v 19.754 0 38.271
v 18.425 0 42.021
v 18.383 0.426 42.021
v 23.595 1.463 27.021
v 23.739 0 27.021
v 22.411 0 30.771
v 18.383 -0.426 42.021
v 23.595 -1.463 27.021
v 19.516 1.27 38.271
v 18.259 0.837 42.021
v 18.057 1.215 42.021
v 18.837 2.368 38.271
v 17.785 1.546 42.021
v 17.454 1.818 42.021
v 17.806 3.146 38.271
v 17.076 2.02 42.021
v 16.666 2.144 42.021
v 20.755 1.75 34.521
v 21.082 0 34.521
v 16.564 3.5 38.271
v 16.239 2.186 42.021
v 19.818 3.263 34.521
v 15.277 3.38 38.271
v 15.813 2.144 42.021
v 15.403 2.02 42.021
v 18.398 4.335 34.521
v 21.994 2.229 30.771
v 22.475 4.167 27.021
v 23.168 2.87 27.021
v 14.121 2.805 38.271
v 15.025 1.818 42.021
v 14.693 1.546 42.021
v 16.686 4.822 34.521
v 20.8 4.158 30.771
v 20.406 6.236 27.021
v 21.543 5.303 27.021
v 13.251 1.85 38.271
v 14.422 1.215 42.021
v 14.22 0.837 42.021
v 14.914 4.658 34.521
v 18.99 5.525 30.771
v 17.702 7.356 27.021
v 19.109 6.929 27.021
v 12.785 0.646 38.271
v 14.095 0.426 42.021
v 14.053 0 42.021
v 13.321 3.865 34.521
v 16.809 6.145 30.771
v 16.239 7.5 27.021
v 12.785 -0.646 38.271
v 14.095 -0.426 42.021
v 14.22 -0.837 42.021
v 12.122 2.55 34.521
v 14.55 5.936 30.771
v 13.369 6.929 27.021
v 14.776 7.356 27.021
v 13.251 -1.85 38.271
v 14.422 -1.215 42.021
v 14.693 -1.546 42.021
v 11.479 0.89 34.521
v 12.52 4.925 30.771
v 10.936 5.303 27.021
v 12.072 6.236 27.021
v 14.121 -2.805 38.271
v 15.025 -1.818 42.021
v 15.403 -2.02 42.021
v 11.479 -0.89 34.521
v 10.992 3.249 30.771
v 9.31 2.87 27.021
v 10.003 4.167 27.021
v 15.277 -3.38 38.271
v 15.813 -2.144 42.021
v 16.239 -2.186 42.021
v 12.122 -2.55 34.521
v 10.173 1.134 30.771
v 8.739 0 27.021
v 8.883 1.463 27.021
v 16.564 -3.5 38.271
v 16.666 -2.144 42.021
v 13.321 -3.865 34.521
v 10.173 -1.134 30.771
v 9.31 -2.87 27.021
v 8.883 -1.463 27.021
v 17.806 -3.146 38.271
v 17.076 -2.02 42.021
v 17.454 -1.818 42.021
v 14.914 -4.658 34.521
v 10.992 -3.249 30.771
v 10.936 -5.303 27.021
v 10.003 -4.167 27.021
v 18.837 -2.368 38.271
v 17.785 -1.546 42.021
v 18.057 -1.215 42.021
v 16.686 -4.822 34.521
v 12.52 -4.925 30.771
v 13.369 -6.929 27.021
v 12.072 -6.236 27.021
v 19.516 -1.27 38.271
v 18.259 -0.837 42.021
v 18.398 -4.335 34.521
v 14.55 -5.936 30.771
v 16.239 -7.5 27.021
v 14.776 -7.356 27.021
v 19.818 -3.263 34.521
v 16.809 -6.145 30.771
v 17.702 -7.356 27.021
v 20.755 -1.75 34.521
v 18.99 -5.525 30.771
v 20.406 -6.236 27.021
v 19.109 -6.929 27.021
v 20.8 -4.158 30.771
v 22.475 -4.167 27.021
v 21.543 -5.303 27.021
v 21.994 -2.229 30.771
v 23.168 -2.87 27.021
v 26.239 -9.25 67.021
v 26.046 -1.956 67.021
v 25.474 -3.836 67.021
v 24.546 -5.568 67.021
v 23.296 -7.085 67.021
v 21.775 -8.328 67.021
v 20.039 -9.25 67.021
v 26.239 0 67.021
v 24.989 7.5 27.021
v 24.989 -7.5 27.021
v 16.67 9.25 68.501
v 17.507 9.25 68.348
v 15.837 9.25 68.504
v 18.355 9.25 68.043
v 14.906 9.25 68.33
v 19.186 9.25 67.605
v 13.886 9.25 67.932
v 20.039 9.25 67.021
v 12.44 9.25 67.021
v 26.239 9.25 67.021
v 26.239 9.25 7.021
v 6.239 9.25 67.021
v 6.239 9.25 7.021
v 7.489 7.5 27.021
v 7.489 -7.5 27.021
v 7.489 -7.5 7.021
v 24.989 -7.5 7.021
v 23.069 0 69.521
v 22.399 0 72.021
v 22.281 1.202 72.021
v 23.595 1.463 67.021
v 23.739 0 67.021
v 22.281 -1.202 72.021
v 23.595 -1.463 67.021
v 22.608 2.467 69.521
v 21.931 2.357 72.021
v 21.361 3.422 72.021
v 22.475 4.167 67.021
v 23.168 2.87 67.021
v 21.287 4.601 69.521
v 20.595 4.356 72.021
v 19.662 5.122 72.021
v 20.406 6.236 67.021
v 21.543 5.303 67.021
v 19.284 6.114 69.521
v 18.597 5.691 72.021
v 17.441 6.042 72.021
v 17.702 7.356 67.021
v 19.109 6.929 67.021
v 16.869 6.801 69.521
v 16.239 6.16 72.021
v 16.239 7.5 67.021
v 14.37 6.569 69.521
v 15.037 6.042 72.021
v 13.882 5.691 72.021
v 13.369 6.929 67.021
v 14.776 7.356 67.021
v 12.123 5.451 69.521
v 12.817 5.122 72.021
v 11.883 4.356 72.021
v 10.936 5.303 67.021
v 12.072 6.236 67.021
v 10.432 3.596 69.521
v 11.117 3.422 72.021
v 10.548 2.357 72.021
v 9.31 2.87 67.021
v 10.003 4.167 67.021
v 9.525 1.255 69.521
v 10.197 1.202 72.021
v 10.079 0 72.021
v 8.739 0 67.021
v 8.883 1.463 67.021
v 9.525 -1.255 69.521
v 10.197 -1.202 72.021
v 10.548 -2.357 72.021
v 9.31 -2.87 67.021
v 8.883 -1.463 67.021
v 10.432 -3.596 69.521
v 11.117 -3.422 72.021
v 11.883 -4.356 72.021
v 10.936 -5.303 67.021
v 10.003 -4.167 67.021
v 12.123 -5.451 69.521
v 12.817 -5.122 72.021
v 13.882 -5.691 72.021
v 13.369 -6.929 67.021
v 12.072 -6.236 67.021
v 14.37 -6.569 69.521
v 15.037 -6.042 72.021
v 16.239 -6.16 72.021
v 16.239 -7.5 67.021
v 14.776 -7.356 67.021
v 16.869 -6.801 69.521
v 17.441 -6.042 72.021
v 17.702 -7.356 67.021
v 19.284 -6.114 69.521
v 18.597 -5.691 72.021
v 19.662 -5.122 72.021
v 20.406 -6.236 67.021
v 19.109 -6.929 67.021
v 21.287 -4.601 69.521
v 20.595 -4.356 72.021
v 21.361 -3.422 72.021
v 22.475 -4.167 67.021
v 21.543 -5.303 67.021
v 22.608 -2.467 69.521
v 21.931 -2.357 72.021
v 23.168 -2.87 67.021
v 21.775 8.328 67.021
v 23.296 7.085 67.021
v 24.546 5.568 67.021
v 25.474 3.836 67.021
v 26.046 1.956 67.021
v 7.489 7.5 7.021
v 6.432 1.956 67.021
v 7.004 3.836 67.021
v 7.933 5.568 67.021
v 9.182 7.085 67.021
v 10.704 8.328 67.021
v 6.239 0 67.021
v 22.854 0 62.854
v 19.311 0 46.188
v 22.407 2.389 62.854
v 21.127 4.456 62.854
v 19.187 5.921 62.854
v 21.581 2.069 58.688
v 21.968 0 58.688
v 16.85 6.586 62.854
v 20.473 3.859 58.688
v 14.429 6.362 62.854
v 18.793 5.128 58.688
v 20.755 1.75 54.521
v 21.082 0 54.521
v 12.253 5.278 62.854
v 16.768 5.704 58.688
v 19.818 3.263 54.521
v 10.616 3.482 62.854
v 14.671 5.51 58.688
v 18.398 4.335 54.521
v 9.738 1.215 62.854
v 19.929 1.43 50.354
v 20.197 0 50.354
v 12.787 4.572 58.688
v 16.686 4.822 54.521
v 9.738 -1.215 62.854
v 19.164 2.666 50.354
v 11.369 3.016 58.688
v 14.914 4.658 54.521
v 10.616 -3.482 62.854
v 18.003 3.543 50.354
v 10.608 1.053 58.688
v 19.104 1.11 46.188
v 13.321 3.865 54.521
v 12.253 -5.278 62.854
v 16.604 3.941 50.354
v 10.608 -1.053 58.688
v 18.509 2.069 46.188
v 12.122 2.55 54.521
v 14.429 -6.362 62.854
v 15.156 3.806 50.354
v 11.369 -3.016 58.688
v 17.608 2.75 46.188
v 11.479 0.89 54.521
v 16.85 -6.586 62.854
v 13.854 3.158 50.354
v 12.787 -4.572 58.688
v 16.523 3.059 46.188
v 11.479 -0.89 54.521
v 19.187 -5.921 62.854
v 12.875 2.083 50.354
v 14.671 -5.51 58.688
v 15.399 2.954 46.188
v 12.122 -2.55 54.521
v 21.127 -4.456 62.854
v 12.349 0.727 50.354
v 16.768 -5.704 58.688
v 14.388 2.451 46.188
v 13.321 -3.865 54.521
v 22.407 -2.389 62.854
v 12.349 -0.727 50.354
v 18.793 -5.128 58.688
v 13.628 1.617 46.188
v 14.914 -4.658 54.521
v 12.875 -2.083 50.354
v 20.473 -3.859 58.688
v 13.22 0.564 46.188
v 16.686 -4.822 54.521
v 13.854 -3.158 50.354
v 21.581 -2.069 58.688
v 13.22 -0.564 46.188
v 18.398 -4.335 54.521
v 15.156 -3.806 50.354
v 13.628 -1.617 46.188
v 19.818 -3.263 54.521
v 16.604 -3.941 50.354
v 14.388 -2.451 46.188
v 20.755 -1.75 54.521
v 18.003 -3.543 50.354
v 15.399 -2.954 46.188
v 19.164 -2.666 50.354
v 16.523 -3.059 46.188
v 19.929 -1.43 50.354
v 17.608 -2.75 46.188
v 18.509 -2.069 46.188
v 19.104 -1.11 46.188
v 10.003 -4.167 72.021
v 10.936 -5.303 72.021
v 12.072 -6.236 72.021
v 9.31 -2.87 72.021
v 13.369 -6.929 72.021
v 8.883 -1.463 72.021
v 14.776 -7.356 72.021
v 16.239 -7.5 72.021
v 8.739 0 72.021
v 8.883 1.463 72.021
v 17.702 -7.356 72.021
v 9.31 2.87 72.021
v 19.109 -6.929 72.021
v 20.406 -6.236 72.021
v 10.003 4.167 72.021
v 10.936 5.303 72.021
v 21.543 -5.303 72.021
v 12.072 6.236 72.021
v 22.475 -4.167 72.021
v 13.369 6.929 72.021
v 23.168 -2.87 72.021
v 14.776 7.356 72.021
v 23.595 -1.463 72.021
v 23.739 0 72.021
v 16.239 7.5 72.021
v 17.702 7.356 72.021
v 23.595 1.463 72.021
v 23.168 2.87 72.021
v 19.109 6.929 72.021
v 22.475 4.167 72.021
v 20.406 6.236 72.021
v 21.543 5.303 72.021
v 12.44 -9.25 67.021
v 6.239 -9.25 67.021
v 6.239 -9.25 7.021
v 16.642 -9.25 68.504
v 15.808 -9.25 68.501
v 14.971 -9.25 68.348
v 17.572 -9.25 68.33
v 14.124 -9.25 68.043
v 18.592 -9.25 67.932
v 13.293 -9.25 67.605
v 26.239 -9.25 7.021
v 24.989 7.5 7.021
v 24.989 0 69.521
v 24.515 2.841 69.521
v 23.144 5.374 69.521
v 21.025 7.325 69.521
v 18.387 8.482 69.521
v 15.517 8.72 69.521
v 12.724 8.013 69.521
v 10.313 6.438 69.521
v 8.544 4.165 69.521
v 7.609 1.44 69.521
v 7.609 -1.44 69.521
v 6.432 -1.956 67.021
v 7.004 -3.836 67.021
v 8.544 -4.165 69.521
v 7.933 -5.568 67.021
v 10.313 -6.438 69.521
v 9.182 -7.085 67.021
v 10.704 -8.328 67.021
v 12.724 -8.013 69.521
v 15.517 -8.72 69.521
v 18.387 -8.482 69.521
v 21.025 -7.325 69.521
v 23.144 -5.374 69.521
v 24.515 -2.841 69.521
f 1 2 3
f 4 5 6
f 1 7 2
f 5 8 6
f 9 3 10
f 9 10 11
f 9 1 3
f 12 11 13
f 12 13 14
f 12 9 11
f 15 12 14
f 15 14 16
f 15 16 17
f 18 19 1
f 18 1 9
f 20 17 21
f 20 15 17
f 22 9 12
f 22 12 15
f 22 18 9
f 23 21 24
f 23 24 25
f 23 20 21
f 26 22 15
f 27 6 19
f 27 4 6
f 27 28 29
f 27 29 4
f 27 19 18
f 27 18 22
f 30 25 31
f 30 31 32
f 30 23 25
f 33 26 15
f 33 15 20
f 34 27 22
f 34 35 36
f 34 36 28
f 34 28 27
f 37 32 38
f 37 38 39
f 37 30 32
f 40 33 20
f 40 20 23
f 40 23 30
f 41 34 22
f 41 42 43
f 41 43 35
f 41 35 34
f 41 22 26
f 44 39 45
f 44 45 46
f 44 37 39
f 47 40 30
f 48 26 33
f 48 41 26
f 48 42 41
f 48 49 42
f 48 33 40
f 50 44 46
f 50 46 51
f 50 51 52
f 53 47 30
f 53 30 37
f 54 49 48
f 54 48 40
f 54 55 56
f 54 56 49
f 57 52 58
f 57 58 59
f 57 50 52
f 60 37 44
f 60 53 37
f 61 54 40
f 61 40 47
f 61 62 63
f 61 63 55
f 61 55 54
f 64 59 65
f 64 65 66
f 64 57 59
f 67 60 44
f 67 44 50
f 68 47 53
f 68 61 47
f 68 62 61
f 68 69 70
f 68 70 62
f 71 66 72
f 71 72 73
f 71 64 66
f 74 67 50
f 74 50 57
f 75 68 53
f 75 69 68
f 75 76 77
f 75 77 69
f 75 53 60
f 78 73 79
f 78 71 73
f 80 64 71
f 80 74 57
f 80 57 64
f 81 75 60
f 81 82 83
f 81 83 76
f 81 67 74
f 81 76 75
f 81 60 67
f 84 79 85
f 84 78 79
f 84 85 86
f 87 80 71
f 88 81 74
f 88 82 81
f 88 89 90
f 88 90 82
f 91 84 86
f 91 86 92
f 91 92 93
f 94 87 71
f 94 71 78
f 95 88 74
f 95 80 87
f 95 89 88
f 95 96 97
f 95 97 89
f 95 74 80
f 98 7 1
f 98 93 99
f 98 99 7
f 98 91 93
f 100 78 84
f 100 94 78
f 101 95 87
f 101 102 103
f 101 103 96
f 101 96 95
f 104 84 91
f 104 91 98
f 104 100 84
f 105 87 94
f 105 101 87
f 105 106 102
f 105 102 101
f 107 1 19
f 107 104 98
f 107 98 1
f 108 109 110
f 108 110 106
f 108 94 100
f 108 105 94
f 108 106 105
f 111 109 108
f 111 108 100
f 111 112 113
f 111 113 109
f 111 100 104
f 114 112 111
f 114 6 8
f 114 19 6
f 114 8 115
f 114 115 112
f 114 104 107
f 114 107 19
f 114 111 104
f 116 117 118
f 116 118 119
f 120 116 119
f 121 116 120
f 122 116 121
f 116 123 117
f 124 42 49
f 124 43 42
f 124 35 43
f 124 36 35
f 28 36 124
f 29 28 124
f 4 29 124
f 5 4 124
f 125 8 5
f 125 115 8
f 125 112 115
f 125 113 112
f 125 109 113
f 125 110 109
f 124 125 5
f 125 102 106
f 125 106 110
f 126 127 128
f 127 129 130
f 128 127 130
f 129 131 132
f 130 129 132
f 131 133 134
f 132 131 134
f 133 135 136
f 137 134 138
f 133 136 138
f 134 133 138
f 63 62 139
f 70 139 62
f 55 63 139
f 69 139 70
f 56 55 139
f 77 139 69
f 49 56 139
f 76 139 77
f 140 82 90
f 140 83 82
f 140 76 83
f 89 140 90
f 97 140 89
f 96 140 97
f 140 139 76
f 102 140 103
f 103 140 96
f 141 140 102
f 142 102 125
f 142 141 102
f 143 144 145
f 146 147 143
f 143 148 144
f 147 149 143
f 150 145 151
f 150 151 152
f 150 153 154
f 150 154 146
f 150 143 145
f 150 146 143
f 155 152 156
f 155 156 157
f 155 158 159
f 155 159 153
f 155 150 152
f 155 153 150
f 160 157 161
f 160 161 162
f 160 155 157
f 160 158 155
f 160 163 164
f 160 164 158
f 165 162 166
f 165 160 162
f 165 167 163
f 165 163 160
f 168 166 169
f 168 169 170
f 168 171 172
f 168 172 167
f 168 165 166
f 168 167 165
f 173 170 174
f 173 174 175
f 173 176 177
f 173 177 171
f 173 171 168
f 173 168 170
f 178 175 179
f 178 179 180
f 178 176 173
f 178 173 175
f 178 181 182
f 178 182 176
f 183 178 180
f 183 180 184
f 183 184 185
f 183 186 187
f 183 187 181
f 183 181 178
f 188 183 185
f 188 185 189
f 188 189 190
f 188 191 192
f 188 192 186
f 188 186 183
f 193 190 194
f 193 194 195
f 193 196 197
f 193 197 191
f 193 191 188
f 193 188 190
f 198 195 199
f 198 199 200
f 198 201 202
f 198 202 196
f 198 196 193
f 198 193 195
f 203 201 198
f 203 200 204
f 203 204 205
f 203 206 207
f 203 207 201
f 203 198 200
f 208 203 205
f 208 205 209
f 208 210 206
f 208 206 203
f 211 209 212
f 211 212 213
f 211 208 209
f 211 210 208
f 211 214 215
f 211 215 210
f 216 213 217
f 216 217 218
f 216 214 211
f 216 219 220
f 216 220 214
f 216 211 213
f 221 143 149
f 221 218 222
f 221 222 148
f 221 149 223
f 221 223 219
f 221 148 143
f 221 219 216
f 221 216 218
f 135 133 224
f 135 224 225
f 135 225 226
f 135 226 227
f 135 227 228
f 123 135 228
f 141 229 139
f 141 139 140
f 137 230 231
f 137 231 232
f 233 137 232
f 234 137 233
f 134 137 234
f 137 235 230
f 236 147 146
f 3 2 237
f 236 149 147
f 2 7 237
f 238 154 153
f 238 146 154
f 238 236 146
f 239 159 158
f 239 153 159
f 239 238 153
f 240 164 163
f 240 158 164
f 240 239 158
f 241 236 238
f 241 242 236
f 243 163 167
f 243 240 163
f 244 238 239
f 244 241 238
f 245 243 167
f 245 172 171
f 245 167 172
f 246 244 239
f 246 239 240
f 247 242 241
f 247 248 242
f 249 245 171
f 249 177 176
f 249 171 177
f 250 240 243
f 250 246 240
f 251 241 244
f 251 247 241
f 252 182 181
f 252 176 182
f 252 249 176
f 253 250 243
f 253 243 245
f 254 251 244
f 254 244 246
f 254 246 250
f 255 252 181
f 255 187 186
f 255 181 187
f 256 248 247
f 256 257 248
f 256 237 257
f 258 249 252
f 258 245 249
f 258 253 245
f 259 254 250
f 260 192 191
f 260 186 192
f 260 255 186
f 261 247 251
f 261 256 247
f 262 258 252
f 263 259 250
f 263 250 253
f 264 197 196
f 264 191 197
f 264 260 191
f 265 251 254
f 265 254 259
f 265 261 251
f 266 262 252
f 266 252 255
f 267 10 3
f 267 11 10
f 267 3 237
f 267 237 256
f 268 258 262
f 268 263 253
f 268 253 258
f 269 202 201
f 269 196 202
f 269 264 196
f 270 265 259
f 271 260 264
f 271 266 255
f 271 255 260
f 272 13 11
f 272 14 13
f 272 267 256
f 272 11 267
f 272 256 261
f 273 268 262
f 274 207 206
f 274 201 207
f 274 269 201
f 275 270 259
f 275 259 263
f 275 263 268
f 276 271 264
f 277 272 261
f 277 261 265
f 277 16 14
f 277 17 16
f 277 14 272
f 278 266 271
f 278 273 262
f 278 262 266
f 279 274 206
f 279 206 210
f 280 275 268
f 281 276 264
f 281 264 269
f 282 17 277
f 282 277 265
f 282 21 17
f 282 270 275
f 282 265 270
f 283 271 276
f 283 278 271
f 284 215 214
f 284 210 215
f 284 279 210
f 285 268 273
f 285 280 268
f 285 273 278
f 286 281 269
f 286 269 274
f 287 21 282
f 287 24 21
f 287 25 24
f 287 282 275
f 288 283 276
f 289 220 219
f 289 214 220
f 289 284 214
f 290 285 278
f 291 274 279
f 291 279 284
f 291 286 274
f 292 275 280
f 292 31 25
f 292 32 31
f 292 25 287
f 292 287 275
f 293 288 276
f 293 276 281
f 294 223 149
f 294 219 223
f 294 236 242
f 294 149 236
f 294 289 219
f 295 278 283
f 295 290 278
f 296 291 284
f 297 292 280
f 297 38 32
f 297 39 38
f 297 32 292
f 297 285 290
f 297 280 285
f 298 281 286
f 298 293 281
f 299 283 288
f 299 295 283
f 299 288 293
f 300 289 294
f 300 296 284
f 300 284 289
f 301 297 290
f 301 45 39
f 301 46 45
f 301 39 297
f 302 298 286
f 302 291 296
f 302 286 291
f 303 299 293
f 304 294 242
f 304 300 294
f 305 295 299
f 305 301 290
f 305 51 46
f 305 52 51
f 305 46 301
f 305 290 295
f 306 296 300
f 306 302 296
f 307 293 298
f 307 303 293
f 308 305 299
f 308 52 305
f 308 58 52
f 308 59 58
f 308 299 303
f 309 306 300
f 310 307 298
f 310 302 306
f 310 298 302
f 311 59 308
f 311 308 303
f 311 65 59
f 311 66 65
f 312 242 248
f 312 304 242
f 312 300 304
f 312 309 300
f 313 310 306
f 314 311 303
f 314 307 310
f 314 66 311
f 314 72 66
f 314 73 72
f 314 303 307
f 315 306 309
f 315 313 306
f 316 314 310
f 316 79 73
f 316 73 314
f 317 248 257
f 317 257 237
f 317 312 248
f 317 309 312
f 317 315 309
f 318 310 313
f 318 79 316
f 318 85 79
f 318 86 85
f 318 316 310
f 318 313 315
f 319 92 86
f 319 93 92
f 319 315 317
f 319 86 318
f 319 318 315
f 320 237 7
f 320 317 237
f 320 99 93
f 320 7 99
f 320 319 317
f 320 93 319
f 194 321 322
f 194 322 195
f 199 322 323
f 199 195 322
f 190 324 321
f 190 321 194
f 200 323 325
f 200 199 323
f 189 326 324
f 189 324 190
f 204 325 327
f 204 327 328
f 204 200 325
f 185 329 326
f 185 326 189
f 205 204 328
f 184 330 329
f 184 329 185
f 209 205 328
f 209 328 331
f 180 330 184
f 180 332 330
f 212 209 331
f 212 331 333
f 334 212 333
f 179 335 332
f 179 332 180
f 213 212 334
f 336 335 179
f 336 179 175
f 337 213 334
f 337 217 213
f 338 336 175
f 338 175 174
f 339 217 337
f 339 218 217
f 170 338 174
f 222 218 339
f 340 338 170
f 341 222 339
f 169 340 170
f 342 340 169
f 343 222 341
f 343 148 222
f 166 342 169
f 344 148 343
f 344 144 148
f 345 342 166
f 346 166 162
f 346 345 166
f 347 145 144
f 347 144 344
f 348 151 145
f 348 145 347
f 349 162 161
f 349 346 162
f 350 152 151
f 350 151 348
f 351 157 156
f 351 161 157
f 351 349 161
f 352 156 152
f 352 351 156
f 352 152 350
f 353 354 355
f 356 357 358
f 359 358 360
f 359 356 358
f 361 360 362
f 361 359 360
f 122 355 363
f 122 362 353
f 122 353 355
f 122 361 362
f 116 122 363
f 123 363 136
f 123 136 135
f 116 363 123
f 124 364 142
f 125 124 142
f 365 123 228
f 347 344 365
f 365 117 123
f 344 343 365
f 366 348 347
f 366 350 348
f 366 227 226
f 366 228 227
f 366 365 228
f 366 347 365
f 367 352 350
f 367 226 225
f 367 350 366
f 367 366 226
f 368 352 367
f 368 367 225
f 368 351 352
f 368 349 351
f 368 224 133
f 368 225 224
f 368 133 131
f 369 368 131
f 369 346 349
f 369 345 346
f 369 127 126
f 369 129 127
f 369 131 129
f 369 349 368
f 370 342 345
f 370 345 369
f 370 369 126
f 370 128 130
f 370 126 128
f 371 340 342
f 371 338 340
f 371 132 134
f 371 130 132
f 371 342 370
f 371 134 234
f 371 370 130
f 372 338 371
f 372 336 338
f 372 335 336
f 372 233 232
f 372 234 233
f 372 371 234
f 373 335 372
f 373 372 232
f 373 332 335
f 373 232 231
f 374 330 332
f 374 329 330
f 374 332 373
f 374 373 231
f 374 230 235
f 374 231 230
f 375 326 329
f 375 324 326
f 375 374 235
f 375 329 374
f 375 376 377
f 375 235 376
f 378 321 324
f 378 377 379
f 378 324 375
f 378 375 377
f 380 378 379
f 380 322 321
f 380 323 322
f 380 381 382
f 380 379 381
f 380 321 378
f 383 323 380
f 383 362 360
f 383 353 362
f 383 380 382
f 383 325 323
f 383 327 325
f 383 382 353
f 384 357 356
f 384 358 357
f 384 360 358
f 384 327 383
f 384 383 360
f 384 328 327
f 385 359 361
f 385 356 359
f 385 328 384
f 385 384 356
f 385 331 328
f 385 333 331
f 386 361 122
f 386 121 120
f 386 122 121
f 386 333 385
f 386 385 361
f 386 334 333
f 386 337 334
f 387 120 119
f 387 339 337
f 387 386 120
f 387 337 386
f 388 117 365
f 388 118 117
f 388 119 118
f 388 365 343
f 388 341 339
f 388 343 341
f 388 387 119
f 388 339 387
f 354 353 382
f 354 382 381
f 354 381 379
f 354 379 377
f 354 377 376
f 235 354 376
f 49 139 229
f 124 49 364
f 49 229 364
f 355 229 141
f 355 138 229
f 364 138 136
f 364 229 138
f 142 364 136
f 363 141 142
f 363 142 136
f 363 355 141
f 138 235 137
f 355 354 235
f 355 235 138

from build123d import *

# Parameters (mm, degrees)
F0_W      = 7.5
F0_H      = 20
F2_DEPTH  = 9.25
F4_DEPTH  = 40
F7_DEPTH  = 5
F9_W      = 17.5
F9_H      = 15
F10_DEPTH = 20


with BuildPart() as f1:
    # F0 (on Front) → F1 (revolve)
    with BuildSketch(Plane.XZ):
        Polygon((18.4253171254, 42.021107682), (23.7392311672, 27.021107682), (23.7392311672, 67.021107682), align=None)
    revolve(axis=Axis((16.2392311672, 0, 39.521107682), (0, 0, 1)))


with BuildPart() as f1b:
    # F0 (on Front) → F1, piece 2 (revolve)
    with BuildSketch(Plane.XZ):
        Polygon((22.399485205, 72.021107682), (23.7392311672, 67.021107682), (23.7392311672, 72.021107682), align=None)
        Polygon((23.7392311672, 72.021107682), (23.7392311672, 67.021107682), (26.2392311672, 67.021107682), align=None)
    revolve(axis=Axis((16.2392311672, 0, 39.521107682), (0, 0, 1)))

    # F6 (on face) → F7 (cut, through all)
    with BuildSketch(Plane(origin=(0, 0, 67.021107682), x_dir=(1, 0, 0), z_dir=(0, 0, -1))):
        with BuildLine():
            Line((12.4395601288, 9.25), (20.0389022056, 9.25))
            ThreePointArc((20.0389022056, 9.25), (16.2392311672, 10), (12.4395601288, 9.25))
        make_face()
        with BuildLine():
            ThreePointArc((12.4395601288, -9.25), (16.2392311672, -10), (20.0389022056, -9.25))
            Line((20.0389022056, -9.25), (12.4395601288, -9.25))
        make_face()
    extrude(amount=-F7_DEPTH, mode=Mode.SUBTRACT)


with BuildPart() as f2:
    # F0 (on Front) → F2 (new body, symmetric)
    with BuildSketch(Plane.XZ):
        Polygon((6.2392311672, 7.021107682), (8.7392311672, 7.021107682), (8.7392311672, 27.021107682), (8.7392311672, 67.021107682), (6.2392311672, 67.021107682), align=None)
        Polygon((23.7392311672, 27.021107682), (23.7392311672, 7.021107682), (26.2392311672, 7.021107682), (26.2392311672, 67.021107682), (23.7392311672, 67.021107682), align=None)
        with Locations((12.4892311672, 17.021107682)):
            Rectangle(F0_W, F0_H)
        with Locations((19.9892311672, 17.021107682)):
            Rectangle(F0_W, F0_H)
    extrude(amount=F2_DEPTH, both=True)


with BuildPart() as f4:
    # F3 (on face) → F4 (new body, through all)
    with BuildSketch(Plane.XY.offset(27.021107682)):
        with BuildLine():
            Line((23.7392311672, -9.25), (23.7392311672, 0))
            ThreePointArc((23.7392311672, 0), (16.2392311556, -7.5), (8.7392311672, 2.31e-08))
            Line((8.7392311672, 2.31e-08), (8.7392311672, -9.25))
            Line((8.7392311672, -9.25), (23.7392311672, -9.25))
        make_face()
    extrude(amount=F4_DEPTH)


with BuildPart() as f4b:
    # F3 (on face) → F4, piece 2 (new body, through all)
    with BuildSketch(Plane.XY.offset(27.021107682)):
        with BuildLine():
            Line((23.7392311672, 0), (23.7392311672, 9.25))
            Line((23.7392311672, 9.25), (8.7392311672, 9.25))
            Line((8.7392311672, 9.25), (8.7392311672, 2.31e-08))
            ThreePointArc((8.7392311672, 2.31e-08), (16.2392311787, 7.5), (23.7392311672, 0))
        make_face()
    extrude(amount=F4_DEPTH)


with BuildPart() as f4_1:
    add(f4.part)

    # F8: union F1b, F2, F1, F4b
    add(f1b.part)
    add(f2.part)
    add(f1.part)
    add(f4b.part)

    # F9 (on face) → F10 (cut)
    with BuildSketch(Plane(origin=(0, 0, 7.021107682), x_dir=(1, 0, 0), z_dir=(0, 0, -1))):
        with Locations((16.2392311672, 0)):
            Rectangle(F9_W, F9_H)
    extrude(amount=-F10_DEPTH, mode=Mode.SUBTRACT)


solid = f4_1.part
